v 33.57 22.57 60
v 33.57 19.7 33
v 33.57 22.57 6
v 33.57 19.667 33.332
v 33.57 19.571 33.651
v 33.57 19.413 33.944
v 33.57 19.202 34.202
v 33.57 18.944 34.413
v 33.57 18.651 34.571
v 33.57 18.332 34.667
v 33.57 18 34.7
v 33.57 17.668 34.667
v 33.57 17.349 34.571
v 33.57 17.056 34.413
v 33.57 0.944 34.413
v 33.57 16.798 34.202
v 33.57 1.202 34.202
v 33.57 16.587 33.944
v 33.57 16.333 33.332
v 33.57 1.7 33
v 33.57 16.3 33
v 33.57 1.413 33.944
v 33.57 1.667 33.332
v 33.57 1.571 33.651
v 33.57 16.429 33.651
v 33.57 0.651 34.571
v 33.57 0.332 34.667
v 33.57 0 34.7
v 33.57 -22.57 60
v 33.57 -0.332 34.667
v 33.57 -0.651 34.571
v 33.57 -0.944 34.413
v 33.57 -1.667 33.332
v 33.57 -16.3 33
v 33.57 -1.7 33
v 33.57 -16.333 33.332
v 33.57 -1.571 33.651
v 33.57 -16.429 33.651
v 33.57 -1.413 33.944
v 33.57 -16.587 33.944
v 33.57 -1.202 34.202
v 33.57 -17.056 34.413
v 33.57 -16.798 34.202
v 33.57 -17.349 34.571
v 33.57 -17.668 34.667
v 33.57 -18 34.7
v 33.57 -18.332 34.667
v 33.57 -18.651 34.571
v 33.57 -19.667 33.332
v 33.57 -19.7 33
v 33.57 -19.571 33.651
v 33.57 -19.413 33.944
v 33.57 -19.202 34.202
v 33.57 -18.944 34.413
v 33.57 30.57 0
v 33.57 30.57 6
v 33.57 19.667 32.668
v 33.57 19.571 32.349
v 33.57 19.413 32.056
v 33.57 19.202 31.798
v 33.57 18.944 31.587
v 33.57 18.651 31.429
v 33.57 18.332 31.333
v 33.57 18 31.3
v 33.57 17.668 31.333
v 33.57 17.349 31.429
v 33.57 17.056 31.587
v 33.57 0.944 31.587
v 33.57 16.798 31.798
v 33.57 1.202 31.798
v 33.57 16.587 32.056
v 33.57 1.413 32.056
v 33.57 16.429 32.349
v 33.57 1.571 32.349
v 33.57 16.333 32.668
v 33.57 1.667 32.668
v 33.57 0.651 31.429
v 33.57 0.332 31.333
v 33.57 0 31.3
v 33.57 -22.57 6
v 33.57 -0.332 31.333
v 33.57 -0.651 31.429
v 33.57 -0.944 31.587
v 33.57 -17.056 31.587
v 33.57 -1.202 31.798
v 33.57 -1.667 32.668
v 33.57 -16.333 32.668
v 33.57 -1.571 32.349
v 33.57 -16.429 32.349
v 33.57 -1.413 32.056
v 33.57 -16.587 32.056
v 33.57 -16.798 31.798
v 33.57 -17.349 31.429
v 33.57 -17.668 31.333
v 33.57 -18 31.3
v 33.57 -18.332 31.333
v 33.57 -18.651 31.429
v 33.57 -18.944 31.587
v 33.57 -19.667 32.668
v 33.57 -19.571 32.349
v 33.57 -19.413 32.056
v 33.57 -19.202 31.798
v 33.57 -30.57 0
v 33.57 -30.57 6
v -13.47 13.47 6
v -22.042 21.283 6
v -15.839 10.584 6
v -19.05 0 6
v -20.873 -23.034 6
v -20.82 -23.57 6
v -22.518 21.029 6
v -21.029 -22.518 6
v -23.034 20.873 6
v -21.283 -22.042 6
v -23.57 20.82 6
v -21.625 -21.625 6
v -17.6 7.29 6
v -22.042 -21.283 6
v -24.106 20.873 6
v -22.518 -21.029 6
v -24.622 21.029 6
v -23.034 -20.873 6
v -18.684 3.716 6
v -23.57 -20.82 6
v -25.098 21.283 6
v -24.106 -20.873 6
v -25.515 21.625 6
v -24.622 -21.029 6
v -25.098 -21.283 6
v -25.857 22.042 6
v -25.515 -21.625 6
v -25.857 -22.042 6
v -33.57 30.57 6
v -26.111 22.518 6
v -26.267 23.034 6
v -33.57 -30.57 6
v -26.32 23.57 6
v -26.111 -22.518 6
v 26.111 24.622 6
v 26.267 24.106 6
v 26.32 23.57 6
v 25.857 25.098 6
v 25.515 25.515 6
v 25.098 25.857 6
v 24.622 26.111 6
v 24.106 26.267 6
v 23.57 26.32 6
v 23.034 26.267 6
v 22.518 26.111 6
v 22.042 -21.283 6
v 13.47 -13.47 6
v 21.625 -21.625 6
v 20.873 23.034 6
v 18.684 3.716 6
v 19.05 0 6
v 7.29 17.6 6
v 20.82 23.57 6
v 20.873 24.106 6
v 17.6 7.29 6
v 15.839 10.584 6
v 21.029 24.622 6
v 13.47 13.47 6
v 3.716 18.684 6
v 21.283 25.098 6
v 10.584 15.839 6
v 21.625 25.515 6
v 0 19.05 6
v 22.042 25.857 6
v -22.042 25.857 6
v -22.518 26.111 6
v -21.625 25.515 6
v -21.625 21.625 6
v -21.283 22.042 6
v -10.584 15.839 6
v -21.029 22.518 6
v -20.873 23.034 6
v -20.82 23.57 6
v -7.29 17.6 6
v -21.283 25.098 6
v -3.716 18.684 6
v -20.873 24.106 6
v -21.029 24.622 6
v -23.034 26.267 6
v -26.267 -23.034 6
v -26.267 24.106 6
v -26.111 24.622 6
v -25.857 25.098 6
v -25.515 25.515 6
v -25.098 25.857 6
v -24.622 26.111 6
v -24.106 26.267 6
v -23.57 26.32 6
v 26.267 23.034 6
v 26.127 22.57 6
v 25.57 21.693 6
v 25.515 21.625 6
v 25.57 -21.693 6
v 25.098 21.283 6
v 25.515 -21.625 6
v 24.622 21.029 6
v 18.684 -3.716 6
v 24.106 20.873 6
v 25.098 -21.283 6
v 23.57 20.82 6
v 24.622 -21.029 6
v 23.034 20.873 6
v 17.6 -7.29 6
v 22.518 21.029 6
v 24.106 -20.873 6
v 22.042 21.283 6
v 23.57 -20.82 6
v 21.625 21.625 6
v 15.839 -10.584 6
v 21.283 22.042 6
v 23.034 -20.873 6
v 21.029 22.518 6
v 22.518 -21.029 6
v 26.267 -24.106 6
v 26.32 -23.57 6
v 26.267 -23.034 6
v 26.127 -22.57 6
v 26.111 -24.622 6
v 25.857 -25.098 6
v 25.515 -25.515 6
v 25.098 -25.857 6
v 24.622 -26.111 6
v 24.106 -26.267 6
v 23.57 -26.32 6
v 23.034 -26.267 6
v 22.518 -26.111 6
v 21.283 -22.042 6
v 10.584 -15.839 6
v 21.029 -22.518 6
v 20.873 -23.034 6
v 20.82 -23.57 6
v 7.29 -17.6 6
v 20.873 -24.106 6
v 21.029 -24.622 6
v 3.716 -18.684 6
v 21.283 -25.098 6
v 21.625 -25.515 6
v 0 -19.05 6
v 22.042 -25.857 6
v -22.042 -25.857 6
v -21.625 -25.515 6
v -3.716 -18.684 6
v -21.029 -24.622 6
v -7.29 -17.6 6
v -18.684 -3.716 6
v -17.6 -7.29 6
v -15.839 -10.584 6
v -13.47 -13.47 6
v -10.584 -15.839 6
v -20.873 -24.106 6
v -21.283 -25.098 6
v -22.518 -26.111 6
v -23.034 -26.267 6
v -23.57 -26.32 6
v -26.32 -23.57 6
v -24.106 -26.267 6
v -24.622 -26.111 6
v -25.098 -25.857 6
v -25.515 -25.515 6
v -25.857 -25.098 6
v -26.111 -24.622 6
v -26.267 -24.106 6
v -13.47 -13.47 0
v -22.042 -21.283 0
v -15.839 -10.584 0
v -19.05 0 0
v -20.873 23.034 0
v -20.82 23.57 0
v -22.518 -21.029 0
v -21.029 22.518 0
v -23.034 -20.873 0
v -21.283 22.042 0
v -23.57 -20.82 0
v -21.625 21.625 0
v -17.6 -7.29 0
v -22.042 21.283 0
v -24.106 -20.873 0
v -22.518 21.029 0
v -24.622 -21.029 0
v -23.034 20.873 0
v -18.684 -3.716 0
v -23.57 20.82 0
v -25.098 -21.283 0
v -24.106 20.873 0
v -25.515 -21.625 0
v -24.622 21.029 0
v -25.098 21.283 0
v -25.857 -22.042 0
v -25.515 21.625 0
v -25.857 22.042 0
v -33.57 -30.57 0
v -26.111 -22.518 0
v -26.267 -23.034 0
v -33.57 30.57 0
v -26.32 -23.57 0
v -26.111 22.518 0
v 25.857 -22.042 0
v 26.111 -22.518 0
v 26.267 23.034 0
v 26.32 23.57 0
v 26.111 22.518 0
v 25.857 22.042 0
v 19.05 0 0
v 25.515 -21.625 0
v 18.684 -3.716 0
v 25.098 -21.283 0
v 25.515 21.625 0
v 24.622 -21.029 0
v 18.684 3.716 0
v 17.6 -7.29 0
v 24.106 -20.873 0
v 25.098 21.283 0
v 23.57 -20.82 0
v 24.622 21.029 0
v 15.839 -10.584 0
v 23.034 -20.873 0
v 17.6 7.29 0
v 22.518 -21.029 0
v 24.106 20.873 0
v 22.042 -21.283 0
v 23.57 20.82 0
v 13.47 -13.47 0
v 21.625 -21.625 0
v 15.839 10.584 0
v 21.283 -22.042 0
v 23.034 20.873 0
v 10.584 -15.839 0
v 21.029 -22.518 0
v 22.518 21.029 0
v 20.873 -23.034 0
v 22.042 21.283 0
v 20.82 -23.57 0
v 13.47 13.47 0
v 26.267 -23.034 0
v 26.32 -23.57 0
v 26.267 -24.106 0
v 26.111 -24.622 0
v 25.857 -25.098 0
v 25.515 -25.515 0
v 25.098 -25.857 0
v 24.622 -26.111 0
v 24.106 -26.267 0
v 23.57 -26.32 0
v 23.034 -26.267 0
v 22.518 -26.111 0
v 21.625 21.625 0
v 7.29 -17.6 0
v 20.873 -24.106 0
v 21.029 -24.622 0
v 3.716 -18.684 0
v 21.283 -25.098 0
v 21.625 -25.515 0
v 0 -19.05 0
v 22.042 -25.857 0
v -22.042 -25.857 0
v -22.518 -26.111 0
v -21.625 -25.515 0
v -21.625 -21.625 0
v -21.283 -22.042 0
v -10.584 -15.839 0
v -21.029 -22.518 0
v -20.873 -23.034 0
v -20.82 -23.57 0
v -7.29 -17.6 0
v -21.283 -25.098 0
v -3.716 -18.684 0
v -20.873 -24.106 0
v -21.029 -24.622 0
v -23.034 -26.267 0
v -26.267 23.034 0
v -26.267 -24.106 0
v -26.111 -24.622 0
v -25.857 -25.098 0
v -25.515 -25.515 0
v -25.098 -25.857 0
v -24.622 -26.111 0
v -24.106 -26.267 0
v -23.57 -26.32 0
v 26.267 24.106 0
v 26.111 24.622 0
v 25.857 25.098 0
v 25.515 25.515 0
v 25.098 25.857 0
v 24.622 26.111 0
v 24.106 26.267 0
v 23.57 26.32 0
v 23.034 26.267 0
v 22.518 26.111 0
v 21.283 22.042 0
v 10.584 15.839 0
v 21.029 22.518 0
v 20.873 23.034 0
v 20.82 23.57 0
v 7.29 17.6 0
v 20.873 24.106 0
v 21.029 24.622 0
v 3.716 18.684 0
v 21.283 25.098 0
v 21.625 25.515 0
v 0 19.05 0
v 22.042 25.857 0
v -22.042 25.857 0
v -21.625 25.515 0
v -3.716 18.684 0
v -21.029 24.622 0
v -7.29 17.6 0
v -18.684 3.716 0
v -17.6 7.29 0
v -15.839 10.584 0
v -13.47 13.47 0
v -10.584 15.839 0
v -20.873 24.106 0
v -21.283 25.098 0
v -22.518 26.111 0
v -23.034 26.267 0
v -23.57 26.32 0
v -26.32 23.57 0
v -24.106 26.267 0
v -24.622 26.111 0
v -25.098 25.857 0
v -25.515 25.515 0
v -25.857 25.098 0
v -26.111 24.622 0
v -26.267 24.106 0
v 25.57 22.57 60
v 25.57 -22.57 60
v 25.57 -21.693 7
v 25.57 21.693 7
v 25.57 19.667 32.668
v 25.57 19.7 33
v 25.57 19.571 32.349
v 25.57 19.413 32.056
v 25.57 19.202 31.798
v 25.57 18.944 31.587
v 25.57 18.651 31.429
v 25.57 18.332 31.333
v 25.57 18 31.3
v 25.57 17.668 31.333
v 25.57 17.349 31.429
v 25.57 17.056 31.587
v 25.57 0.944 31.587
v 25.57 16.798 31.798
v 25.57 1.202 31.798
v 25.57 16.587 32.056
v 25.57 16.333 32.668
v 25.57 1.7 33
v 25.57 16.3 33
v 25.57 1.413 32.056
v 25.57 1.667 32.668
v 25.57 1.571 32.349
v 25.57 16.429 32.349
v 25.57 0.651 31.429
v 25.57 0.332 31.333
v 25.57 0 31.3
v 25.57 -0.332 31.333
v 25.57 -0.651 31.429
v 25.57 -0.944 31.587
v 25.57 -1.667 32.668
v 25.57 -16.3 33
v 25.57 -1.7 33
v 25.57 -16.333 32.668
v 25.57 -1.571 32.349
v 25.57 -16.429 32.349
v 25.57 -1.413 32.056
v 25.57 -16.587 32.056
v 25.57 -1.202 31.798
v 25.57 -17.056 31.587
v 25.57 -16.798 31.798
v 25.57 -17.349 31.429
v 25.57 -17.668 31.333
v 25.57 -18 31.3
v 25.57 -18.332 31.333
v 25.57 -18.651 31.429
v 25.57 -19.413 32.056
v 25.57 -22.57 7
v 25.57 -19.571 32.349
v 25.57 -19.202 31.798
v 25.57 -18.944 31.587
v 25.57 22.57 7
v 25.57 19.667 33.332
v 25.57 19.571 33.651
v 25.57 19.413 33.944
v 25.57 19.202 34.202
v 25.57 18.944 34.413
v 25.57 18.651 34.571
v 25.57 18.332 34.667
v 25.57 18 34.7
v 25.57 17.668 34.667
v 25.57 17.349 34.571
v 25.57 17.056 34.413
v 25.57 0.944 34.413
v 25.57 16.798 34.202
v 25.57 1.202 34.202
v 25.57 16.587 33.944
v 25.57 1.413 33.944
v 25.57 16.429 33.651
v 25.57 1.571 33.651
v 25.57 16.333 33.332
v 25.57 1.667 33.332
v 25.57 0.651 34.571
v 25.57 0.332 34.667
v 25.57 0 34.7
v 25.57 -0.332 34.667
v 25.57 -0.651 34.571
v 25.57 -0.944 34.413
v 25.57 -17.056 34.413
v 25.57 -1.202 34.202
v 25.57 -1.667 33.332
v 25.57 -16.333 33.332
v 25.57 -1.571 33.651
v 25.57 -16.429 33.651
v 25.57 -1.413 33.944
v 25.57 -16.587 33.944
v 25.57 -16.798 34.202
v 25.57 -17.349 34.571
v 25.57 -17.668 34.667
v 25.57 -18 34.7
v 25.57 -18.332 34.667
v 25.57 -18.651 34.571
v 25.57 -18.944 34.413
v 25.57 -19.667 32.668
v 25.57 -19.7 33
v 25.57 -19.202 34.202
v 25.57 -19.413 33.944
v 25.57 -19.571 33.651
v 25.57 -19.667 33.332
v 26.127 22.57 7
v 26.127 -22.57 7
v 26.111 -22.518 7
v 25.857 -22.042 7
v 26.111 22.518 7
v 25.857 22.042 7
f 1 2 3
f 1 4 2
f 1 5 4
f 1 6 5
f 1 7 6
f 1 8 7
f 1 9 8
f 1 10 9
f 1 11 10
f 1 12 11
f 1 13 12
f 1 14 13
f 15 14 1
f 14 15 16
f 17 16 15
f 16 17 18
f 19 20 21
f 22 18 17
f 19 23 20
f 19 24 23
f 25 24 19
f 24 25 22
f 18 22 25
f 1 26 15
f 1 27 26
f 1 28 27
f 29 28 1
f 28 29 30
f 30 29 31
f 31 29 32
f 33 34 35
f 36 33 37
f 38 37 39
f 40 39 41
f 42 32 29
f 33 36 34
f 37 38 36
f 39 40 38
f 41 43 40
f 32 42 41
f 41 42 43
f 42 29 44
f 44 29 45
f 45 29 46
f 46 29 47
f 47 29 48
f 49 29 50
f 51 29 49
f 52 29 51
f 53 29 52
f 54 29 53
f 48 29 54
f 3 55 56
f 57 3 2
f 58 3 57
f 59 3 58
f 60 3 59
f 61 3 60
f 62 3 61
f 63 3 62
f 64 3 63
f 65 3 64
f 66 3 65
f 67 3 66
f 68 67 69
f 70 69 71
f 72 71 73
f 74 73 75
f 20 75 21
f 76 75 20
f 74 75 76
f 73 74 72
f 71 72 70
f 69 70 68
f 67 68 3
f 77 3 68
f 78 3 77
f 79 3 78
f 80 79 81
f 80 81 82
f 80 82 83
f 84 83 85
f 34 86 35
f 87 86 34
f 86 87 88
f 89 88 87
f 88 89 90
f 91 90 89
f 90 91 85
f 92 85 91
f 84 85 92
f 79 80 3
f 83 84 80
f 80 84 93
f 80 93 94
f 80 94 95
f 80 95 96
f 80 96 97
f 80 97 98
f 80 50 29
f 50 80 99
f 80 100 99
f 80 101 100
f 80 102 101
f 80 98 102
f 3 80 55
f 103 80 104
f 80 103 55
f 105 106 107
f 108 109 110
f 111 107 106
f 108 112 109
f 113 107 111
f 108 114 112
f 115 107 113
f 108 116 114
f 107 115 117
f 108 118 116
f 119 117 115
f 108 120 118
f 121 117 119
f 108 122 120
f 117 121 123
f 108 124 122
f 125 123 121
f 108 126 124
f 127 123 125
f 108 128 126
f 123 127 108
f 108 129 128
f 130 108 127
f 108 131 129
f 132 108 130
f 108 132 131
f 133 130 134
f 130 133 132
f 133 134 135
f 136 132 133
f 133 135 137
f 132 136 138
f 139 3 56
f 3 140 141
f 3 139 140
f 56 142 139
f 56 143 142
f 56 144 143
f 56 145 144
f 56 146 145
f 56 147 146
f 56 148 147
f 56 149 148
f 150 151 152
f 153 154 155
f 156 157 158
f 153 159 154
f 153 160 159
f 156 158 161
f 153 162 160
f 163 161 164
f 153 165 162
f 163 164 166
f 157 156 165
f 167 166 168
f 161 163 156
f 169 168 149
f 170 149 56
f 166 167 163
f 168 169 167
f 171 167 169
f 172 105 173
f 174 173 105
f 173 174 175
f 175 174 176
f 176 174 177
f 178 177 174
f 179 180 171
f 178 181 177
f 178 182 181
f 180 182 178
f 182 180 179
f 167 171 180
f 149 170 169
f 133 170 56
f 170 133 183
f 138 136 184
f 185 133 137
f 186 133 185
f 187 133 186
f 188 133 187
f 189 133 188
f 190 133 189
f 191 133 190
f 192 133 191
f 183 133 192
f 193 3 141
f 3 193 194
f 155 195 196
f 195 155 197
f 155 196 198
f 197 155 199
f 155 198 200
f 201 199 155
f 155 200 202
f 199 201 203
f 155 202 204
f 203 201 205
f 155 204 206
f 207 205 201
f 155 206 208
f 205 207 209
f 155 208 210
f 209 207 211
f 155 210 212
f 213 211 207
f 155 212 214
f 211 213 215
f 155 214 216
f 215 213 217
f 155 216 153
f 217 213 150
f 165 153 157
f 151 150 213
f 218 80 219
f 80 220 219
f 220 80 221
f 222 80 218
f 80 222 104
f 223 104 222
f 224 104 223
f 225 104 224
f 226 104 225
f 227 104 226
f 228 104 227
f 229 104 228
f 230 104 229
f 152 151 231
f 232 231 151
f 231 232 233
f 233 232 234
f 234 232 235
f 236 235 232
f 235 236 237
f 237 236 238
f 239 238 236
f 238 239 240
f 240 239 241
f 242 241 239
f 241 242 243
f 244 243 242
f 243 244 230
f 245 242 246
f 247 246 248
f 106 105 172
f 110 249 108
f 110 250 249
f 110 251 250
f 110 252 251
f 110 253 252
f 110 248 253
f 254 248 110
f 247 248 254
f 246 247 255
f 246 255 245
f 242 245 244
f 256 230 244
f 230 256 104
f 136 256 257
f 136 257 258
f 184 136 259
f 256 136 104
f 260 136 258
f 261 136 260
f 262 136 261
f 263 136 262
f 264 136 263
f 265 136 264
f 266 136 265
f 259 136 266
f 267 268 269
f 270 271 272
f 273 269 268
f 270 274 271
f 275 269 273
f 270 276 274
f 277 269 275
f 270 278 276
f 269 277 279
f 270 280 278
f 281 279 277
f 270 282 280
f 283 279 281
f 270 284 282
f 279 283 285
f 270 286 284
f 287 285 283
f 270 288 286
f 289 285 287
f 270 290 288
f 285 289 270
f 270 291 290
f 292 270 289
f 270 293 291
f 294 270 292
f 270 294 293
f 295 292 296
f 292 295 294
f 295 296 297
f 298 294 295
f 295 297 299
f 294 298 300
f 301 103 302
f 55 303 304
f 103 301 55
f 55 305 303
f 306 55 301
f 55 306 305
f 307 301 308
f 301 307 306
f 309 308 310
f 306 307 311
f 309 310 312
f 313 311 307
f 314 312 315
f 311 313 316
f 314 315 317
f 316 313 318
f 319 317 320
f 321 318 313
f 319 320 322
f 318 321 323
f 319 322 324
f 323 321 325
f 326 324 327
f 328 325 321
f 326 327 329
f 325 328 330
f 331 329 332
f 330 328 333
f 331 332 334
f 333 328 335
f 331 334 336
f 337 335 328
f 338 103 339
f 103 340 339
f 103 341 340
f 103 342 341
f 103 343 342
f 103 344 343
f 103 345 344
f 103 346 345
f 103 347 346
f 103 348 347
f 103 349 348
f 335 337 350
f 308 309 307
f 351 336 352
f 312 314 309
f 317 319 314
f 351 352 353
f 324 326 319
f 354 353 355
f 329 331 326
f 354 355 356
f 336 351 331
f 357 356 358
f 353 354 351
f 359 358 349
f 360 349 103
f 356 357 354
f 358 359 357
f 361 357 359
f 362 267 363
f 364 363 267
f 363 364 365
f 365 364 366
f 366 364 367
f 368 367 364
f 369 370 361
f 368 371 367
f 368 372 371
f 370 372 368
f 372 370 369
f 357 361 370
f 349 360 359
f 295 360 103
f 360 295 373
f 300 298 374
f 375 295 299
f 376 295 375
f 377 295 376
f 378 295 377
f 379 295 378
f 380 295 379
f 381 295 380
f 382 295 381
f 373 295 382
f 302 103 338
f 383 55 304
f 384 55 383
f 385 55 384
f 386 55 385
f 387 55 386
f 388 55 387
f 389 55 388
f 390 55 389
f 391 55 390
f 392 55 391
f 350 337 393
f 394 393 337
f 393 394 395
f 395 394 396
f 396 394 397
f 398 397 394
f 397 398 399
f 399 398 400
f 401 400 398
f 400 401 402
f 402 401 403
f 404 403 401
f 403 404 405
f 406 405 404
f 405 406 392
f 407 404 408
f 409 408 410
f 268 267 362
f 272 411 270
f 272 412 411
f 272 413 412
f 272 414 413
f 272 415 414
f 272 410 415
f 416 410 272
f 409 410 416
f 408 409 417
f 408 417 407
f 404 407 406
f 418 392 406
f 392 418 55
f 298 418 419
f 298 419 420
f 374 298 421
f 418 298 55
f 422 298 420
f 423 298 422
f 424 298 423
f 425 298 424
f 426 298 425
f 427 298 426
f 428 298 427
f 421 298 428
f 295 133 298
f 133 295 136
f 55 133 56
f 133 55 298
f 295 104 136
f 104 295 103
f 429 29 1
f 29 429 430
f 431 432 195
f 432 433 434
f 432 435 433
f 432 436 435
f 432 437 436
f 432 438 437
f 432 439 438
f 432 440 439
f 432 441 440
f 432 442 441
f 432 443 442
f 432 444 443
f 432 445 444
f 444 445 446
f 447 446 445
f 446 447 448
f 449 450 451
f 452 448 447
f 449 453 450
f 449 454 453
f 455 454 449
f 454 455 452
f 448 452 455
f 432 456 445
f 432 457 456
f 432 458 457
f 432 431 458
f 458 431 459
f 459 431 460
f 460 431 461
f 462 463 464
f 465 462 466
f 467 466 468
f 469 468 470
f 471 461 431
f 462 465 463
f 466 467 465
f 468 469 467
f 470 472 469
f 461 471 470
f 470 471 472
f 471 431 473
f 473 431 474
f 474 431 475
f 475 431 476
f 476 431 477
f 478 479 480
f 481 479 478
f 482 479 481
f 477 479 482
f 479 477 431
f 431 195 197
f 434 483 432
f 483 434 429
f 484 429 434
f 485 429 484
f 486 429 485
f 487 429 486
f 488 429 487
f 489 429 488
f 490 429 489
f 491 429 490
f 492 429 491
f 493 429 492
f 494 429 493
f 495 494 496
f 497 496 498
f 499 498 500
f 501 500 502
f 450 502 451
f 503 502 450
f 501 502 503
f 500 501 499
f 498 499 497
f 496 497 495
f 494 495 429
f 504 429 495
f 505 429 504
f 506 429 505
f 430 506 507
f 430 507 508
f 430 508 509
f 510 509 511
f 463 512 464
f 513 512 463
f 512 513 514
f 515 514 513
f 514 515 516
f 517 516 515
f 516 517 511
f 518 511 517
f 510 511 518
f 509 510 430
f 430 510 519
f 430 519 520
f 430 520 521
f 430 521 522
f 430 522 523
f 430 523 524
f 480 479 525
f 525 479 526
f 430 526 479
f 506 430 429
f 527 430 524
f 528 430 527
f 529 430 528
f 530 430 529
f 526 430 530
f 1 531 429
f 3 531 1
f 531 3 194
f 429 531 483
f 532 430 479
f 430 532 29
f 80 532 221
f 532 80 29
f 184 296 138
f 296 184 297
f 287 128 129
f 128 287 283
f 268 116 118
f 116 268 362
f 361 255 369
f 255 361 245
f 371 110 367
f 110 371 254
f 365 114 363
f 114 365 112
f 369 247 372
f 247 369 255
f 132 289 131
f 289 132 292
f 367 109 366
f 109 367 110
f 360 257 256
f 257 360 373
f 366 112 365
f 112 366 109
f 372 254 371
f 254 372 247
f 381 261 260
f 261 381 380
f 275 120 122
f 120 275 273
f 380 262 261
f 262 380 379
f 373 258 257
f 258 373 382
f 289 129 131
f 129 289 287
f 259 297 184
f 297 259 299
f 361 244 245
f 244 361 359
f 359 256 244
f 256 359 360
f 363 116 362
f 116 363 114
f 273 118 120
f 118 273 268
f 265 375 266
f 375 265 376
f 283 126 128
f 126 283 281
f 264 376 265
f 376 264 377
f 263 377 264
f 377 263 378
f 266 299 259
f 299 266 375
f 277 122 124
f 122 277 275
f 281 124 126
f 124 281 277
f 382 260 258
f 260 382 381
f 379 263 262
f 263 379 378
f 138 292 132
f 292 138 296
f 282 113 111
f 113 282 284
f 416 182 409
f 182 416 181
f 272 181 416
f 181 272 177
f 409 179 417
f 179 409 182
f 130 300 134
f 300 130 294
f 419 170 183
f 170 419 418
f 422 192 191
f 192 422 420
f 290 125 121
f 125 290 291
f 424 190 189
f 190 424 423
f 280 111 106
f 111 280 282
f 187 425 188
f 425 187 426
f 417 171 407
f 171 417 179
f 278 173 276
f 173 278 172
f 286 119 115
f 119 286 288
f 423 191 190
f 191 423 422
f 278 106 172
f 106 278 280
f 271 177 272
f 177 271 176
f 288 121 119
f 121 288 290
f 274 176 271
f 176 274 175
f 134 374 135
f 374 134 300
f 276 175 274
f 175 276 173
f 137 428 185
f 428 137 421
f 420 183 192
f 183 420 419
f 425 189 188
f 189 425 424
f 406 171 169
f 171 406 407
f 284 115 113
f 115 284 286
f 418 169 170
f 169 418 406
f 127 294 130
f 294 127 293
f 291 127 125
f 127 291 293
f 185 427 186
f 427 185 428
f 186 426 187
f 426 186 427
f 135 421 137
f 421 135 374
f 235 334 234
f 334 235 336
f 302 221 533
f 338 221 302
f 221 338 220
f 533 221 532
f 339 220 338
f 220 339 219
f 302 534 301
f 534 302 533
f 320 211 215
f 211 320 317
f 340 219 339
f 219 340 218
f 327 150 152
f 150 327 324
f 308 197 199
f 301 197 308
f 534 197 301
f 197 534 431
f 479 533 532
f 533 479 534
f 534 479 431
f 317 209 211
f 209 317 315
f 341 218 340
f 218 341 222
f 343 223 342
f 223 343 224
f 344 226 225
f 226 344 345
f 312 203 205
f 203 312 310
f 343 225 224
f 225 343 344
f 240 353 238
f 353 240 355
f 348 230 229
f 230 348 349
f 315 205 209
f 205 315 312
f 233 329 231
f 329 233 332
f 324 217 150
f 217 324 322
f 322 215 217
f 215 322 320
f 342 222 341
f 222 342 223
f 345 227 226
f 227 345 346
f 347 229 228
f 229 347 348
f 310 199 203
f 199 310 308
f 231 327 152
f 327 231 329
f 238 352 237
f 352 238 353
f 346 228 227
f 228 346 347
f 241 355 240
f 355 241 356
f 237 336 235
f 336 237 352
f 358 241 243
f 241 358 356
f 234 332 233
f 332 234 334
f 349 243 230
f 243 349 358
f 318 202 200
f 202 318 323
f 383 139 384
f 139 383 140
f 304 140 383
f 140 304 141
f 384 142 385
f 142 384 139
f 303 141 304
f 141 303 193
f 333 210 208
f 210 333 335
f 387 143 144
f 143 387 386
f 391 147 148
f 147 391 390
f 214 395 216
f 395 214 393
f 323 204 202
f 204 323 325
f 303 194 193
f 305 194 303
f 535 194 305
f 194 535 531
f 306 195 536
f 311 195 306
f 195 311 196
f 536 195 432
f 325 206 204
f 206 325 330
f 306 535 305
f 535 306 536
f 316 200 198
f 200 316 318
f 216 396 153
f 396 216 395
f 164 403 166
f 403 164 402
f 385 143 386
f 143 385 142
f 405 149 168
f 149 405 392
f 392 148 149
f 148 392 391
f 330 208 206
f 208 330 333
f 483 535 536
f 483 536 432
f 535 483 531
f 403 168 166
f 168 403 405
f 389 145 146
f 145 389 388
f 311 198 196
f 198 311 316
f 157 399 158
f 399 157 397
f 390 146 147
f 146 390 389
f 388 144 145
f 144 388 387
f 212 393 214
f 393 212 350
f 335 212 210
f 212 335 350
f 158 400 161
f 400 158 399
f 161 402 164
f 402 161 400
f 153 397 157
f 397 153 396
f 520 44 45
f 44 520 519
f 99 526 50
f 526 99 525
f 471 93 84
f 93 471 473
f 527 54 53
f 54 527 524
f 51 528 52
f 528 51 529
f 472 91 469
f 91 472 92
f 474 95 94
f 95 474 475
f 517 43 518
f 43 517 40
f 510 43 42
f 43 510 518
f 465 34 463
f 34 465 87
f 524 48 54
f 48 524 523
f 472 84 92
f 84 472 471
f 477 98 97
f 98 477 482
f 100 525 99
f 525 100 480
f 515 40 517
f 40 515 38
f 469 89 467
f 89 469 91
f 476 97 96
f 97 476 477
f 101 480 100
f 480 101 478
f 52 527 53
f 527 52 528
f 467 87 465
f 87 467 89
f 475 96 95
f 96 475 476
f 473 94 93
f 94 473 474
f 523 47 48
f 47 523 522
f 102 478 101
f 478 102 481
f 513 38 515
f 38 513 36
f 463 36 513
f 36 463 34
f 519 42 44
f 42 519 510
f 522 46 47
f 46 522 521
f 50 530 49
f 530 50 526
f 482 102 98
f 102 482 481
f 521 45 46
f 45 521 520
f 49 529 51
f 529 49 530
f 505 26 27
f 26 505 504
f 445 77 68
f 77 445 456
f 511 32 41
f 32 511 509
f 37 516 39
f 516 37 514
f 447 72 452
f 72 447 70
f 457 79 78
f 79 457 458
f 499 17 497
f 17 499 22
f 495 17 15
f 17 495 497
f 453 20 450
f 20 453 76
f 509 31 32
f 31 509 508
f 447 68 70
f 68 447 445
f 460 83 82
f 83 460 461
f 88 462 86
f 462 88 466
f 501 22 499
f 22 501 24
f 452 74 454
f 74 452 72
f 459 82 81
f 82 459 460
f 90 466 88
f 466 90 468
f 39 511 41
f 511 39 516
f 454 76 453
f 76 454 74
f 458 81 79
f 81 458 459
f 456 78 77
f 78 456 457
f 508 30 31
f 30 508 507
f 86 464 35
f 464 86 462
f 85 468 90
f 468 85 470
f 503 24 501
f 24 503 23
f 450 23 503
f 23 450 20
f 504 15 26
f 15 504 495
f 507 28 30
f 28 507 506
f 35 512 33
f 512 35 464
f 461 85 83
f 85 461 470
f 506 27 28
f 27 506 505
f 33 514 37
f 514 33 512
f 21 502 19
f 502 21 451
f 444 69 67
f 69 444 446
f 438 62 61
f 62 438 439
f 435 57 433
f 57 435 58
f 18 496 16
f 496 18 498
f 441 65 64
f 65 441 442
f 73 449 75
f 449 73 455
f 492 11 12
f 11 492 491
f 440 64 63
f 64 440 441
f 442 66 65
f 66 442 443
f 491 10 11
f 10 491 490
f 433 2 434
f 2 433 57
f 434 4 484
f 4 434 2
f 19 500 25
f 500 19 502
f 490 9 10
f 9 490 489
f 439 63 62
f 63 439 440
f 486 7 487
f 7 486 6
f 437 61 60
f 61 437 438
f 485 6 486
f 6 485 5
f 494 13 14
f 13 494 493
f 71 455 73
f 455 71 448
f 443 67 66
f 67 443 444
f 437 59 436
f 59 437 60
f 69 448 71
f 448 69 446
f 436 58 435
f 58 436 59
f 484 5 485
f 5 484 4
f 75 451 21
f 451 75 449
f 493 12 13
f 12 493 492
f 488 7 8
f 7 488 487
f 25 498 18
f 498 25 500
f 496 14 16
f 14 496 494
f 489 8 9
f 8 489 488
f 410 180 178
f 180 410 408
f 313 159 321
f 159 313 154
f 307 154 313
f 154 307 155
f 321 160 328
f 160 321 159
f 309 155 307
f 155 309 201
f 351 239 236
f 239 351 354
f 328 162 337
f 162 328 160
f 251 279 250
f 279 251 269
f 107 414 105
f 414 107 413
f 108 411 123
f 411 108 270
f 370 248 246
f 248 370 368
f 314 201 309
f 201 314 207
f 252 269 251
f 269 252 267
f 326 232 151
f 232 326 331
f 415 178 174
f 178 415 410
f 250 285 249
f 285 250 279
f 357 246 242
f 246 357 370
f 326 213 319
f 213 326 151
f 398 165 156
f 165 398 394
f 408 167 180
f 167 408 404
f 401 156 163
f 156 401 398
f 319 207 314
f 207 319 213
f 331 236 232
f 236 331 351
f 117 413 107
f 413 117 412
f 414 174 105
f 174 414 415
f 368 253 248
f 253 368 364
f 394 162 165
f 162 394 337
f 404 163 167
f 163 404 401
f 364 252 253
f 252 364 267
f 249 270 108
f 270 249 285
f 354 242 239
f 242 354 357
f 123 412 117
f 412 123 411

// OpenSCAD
$fn = 32;

// ----------------------------------------------------------------------
// Motor mount plate: NEMA23, 67.14 x 61.14 x 66 mm
// ----------------------------------------------------------------------

// --- parameters (mm) ---
plate_w = 67.14;          // plate length, X
plate_d = 61.14;          // plate width, Y
plate_t = 6;              // plate thickness
pattern = 47.14;          // NEMA23 bolt spacing
motor_d = 5.5;            // NEMA23 screw clearance
pilot_d = 38.1;           // pilot boss bore
second_d = 3.4;           // second fastener hole
wall_h = 60;              // upright height
wall_t = 8;               // upright thickness

module plate() {
  translate([-plate_w / 2, -plate_d / 2, 0]) cube([plate_w, plate_d, plate_t]);
}

module motor_holes() {
  for (sx = [-1, 1]) for (sy = [-1, 1])
    translate([sx * pattern / 2, sy * pattern / 2, -1])
      cylinder(h = plate_t + 2, d = motor_d);
}
module upright() {
  /* wall sunk 1 mm into the plate for a positive overlap */
  translate([plate_w / 2 - wall_t, -plate_d / 2 + wall_t, plate_t - 1])
    cube([wall_t, plate_d - 2 * wall_t, wall_h - plate_t + 1]);
}

difference() {
  union() {
    plate();
    upright();
  }
  motor_holes();
  translate([0, 0, -1]) cylinder(h = plate_t + 2, d = pilot_d);
  for (i = [0 : 2])
    translate([plate_w / 2 - wall_t - 1, (i - 1) * wall_h * 0.3, plate_t + wall_h * 0.45]) rotate([0, 90, 0]) cylinder(h = wall_t + 2, d = second_d);
}
